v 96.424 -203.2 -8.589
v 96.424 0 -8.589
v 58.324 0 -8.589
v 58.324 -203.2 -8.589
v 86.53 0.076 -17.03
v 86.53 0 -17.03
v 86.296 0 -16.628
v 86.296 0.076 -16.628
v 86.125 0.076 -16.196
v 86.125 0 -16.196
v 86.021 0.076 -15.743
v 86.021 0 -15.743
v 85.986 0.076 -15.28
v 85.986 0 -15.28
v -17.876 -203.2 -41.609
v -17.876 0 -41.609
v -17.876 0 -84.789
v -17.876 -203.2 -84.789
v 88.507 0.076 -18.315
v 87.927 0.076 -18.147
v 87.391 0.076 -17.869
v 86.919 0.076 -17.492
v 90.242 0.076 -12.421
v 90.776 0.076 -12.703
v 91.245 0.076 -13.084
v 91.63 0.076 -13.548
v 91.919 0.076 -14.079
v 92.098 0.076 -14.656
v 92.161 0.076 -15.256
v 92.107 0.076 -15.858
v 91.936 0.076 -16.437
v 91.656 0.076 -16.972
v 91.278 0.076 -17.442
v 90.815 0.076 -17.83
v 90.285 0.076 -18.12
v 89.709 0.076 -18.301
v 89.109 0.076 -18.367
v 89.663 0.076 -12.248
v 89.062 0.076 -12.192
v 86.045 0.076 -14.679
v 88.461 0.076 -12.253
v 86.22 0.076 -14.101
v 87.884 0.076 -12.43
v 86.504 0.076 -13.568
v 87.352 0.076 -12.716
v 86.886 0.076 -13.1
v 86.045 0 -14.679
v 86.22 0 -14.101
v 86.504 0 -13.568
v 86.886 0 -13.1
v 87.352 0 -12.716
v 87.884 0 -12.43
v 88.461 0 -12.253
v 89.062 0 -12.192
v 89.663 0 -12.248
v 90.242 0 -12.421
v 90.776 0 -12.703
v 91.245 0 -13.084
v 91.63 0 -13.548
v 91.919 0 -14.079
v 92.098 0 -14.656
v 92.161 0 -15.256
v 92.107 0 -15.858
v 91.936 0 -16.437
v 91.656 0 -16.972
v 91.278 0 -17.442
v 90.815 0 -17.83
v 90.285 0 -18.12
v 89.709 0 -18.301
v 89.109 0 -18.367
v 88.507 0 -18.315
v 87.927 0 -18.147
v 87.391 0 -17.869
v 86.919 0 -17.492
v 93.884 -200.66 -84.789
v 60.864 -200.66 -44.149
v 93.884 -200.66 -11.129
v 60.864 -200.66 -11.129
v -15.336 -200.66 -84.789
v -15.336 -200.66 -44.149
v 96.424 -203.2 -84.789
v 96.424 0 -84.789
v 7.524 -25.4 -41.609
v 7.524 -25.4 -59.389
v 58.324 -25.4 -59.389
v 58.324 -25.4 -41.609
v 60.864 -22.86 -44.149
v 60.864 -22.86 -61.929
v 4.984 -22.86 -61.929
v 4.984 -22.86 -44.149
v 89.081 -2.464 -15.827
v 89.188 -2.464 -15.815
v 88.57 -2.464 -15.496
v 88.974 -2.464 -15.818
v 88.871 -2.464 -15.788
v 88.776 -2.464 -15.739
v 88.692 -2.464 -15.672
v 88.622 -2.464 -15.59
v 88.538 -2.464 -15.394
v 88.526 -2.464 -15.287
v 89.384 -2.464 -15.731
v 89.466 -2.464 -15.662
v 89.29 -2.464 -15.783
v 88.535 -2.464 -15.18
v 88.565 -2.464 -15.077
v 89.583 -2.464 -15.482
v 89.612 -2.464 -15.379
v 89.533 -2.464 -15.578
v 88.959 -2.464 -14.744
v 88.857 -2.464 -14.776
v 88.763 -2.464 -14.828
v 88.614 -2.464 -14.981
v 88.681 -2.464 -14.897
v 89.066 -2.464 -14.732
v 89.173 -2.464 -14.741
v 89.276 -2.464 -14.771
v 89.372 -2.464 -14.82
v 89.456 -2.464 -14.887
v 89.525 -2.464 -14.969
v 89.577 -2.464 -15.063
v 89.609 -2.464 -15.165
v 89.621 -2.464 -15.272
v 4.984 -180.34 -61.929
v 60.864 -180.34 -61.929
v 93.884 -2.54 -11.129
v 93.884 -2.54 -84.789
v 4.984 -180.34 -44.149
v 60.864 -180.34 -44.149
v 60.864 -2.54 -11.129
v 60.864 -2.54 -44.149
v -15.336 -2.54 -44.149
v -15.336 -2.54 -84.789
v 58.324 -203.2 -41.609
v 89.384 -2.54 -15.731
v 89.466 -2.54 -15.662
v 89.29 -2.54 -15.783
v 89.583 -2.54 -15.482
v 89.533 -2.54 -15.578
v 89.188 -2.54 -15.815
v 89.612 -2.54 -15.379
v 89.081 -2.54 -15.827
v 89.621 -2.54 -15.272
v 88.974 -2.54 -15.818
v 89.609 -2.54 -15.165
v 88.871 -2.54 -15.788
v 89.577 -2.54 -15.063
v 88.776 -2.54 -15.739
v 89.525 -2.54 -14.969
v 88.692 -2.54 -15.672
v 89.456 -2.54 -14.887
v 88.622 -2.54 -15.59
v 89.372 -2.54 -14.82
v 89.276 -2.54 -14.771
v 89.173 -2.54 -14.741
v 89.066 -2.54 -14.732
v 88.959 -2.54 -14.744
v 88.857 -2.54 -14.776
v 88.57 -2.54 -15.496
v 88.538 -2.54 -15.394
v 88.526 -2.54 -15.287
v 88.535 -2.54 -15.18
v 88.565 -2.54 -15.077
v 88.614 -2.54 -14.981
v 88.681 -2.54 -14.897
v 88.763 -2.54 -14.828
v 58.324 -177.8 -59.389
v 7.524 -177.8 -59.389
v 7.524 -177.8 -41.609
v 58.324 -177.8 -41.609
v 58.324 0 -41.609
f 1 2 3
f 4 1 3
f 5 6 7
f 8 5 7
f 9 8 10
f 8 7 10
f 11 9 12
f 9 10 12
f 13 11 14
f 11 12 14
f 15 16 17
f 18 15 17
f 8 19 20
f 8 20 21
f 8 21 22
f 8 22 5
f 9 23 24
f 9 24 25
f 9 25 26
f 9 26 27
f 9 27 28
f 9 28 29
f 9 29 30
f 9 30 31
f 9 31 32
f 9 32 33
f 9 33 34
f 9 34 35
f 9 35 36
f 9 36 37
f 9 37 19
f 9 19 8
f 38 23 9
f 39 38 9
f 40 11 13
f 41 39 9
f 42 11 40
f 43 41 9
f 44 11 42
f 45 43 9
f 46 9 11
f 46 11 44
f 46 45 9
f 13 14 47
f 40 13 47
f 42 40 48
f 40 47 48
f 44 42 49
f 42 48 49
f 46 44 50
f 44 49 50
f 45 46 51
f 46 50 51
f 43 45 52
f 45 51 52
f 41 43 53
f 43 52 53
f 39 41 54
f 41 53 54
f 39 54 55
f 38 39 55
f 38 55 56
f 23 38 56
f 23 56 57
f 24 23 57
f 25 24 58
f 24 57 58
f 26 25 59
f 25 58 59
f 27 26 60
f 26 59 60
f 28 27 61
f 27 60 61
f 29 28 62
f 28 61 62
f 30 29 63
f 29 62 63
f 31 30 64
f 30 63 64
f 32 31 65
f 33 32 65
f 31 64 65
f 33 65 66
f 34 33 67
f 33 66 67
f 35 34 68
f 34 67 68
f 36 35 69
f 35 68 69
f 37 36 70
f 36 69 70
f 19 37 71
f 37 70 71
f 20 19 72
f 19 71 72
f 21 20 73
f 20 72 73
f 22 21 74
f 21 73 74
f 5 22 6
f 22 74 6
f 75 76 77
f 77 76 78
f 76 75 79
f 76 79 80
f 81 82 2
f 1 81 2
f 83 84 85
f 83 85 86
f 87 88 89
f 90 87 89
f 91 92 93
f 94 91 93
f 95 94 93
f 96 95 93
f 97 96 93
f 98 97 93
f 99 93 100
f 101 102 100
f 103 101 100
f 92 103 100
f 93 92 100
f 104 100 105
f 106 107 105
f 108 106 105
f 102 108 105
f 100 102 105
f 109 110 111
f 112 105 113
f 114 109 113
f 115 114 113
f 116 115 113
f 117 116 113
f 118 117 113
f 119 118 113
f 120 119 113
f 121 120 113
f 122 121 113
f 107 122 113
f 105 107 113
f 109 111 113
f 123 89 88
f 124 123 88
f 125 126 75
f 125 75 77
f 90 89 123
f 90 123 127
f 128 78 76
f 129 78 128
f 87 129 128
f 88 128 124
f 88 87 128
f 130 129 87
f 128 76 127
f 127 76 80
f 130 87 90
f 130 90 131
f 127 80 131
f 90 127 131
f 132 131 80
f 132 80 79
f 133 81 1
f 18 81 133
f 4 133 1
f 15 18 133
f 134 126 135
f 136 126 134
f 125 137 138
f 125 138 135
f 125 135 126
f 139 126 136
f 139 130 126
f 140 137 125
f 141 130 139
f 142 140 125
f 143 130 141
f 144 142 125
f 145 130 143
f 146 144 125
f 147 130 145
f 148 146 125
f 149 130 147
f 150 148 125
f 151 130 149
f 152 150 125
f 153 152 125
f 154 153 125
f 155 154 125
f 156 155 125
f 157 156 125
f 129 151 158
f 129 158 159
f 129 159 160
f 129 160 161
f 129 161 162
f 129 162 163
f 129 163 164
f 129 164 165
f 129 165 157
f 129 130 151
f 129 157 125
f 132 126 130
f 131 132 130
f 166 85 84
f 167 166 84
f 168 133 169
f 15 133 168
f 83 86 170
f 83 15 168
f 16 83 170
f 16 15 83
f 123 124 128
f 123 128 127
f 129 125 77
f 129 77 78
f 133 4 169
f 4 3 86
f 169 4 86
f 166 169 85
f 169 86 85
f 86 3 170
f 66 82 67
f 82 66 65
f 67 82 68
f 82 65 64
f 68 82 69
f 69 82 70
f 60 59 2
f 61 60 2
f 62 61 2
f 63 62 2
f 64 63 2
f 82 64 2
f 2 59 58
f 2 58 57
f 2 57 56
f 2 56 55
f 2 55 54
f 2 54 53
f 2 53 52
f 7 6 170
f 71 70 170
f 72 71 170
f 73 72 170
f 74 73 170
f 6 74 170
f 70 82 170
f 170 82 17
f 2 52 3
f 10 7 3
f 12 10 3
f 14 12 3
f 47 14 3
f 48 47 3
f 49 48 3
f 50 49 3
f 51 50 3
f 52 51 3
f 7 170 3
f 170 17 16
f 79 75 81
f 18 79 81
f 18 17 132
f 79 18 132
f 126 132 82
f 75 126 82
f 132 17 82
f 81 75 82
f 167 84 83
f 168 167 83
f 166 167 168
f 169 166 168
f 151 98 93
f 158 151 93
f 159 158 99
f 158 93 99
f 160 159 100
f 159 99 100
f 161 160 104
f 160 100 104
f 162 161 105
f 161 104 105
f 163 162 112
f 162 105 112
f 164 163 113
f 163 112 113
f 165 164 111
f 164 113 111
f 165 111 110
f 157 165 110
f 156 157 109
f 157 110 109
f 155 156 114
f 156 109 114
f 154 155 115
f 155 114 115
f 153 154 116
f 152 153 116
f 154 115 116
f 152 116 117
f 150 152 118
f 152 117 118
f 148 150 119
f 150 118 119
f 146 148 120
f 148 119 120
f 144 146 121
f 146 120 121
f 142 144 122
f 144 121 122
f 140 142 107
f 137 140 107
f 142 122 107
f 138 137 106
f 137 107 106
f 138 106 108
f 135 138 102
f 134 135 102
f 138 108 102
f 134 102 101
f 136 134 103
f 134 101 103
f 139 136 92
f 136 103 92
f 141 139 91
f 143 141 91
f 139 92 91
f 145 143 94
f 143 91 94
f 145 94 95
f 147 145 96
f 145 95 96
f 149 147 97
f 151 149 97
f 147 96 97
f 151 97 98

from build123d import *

# Parameters (mm, degrees)
F1_DEPTH      = 203.2
F2_W          = 25.4
F2_H          = 17.78
F3_DEPTH      = 50.8
F4_W          = 25.4
F4_H          = 17.78
F5_DEPTH      = 50.8
F11_DEPTH     = 0.0762
F31_T         = 2.54
F31_T3_DEPTH  = 30.48
F31_T5_DEPTH  = 22.86
F31_T7_DEPTH  = 157.48
F31_T9_DEPTH  = 30.48
F31_T11_DEPTH = 55.88


# Not quite as in the source:
# - a shell that OpenCascade refuses in one call is made with other operations: the cavity is built on its own and cut out
# - the program builds the solid bodies; features that only make, move or delete a surface that nothing else refers to are left out


with BuildPart() as f1:
    # F0 (on Front) → F1 (new body)
    with BuildSketch(Plane.XZ):
        Polygon((7.5239408249, -41.6093189047), (-17.8760591751, -41.6093189047), (-17.8760591751, -84.7893189047), (96.4239408249, -84.7893189047), (96.4239408249, -8.5893189047), (58.3239408249, -8.5893189047), (58.3239408249, -59.3893189047), (7.5239408249, -59.3893189047), align=None)
    extrude(amount=F1_DEPTH)

    # F2 (on face) → F3 (join)
    with BuildSketch(Plane.YZ.offset(7.5239408249)):
        with Locations((-190.5, -50.4993189047)):
            Rectangle(F2_W, F2_H)
    extrude(amount=F3_DEPTH)

    # F4 (on face) → F5 (join)
    with BuildSketch(Plane.YZ.offset(7.5239408249)):
        with Locations((-12.7, -50.4993189047)):
            Rectangle(F4_W, F4_H)
    extrude(amount=F5_DEPTH)

    # F9 (on face) → F11 (join)
    with BuildSketch(Plane(origin=(0, 0, 0), x_dir=(-1, 0, 0), z_dir=(0, 1, 0))):
        with BuildLine():
            ThreePointArc((-85.9858192503, -15.2795063332), (-92.0223010679, -14.3629027521), (-86.5299954351, -17.0300836035))
            ThreePointArc((-86.5299954351, -17.0300836035), (-86.12500001, -16.1961099143), (-85.9858192503, -15.2795063332))
        make_face()
    extrude(amount=F11_DEPTH)

    # F31: shell of thickness 2.54, made by hand


with BuildPart() as f31_core1:
    # F31_t2: copy of F1
    add(f1.part)

    # the walls: a layer under each face that stays
    f31_faces = [f31_core1.faces().sort_by_distance(p)[0] for p in [
        (77.3739408249, -101.6, -8.5893189047),
        (96.4239408249, -101.6, -46.6893189047),
        (58.3239408249, -101.6, -33.9893189047),
        (39.2739408249, 0, -46.6893189047),
        (39.2739408249, -203.2, -46.6893189047),
        (-5.1760591751, -33.8666666667, -41.6093189047),
        (32.9239408249, -25.4, -50.4993189047),
        (32.9239408249, -101.6, -59.3893189047),
        (32.9239408249, -177.8, -50.4993189047),
        (-17.8760591751, -101.6, -63.1993189047),
        (91.6173056428, 0.0381, -13.5289290629),
        (7.5239408249, -101.6, -50.4993189047),
        (89.0736505389, 0.0762, -15.2795063332),
    ]]
    thicken(f31_faces, amount=-F31_T, mode=Mode.SUBTRACT)

    # F31_s4 → F31_t3 (cut)
    with BuildSketch(Plane.XZ.offset(-2.54)):
        Polygon((58.2985408249, -41.5839189047), (60.8639408249, -41.6093189047), (60.8639408249, -44.1493189047), (58.3239408249, -44.1493189047), align=None)
    extrude(amount=F31_T3_DEPTH, mode=Mode.SUBTRACT)

    # F31_s6 → F31_t5 (cut)
    with BuildSketch(Plane.XY.offset(-61.9293189047)):
        Polygon((58.2985408249, -25.4254), (60.8639408249, -25.4), (60.8639408249, -22.86), (58.3239408249, -22.86), align=None)
        Polygon((58.2985408249, -177.7746), (60.8639408249, -177.8), (60.8639408249, -180.34), (58.3239408249, -180.34), align=None)
        Polygon((7.5493408249, -25.4254), (7.5239408249, -22.86), (4.9839408249, -22.86), (4.9839408249, -25.4), align=None)
        Polygon((7.5493408249, -177.7746), (7.5239408249, -180.34), (4.9839408249, -180.34), (4.9839408249, -177.8), align=None)
    extrude(amount=F31_T5_DEPTH, mode=Mode.SUBTRACT)

    # F31_s8 → F31_t7 (cut)
    with BuildSketch(Plane.XZ.offset(22.86)):
        Polygon((58.2985408249, -59.3639189047), (60.8639408249, -59.3893189047), (60.8639408249, -61.9293189047), (58.3239408249, -61.9293189047), align=None)
        Polygon((7.5493408249, -59.3639189047), (7.5239408249, -61.9293189047), (4.9839408249, -61.9293189047), (4.9839408249, -59.3893189047), align=None)
    extrude(amount=F31_T7_DEPTH, mode=Mode.SUBTRACT)

    # F31_s10 → F31_t9 (cut)
    with BuildSketch(Plane.XZ.offset(175.26)):
        Polygon((58.2985408249, -41.5839189047), (60.8639408249, -41.6093189047), (60.8639408249, -44.1493189047), (58.3239408249, -44.1493189047), align=None)
    extrude(amount=F31_T9_DEPTH, mode=Mode.SUBTRACT)

    # F31_s12 → F31_t11 (cut)
    with BuildSketch(Plane.YZ.offset(4.9839408249)):
        Polygon((-25.4254, -59.3639189047), (-22.86, -59.3893189047), (-22.86, -61.9293189047), (-25.4, -61.9293189047), align=None)
        Polygon((-177.7746, -59.3639189047), (-177.8, -61.9293189047), (-180.34, -61.9293189047), (-180.34, -59.3893189047), align=None)
    extrude(amount=F31_T11_DEPTH, mode=Mode.SUBTRACT)

    # F31_s13 → F31_t14 (revolve, cut)
    with BuildSketch(Plane(origin=(35.7646863661, 0, -51.9674444282), x_dir=(0, 1, 0), z_dir=(0.5669277583, 0, -0.8237675139))):
        Polygon((0.0254, 61.6003720947), (-2.54, 61.6257720947), (-2.54, 64.1657720947), (0, 64.1657720947), align=None)
    revolve(axis=Axis((89.0736505389, 0, -15.2795063332), (0, 1, 0)), mode=Mode.SUBTRACT)


with BuildPart() as f1_1:
    add(f1.part)

    # what is left inside the walls is the cavity
    f31_cavity = [f31_core1.part.solids().sort_by_distance(p)[0] for p in [
        (39.273941, -134.62, -84.763919),
    ]]
    add(f31_cavity, mode=Mode.SUBTRACT)


solid = f1_1.part
